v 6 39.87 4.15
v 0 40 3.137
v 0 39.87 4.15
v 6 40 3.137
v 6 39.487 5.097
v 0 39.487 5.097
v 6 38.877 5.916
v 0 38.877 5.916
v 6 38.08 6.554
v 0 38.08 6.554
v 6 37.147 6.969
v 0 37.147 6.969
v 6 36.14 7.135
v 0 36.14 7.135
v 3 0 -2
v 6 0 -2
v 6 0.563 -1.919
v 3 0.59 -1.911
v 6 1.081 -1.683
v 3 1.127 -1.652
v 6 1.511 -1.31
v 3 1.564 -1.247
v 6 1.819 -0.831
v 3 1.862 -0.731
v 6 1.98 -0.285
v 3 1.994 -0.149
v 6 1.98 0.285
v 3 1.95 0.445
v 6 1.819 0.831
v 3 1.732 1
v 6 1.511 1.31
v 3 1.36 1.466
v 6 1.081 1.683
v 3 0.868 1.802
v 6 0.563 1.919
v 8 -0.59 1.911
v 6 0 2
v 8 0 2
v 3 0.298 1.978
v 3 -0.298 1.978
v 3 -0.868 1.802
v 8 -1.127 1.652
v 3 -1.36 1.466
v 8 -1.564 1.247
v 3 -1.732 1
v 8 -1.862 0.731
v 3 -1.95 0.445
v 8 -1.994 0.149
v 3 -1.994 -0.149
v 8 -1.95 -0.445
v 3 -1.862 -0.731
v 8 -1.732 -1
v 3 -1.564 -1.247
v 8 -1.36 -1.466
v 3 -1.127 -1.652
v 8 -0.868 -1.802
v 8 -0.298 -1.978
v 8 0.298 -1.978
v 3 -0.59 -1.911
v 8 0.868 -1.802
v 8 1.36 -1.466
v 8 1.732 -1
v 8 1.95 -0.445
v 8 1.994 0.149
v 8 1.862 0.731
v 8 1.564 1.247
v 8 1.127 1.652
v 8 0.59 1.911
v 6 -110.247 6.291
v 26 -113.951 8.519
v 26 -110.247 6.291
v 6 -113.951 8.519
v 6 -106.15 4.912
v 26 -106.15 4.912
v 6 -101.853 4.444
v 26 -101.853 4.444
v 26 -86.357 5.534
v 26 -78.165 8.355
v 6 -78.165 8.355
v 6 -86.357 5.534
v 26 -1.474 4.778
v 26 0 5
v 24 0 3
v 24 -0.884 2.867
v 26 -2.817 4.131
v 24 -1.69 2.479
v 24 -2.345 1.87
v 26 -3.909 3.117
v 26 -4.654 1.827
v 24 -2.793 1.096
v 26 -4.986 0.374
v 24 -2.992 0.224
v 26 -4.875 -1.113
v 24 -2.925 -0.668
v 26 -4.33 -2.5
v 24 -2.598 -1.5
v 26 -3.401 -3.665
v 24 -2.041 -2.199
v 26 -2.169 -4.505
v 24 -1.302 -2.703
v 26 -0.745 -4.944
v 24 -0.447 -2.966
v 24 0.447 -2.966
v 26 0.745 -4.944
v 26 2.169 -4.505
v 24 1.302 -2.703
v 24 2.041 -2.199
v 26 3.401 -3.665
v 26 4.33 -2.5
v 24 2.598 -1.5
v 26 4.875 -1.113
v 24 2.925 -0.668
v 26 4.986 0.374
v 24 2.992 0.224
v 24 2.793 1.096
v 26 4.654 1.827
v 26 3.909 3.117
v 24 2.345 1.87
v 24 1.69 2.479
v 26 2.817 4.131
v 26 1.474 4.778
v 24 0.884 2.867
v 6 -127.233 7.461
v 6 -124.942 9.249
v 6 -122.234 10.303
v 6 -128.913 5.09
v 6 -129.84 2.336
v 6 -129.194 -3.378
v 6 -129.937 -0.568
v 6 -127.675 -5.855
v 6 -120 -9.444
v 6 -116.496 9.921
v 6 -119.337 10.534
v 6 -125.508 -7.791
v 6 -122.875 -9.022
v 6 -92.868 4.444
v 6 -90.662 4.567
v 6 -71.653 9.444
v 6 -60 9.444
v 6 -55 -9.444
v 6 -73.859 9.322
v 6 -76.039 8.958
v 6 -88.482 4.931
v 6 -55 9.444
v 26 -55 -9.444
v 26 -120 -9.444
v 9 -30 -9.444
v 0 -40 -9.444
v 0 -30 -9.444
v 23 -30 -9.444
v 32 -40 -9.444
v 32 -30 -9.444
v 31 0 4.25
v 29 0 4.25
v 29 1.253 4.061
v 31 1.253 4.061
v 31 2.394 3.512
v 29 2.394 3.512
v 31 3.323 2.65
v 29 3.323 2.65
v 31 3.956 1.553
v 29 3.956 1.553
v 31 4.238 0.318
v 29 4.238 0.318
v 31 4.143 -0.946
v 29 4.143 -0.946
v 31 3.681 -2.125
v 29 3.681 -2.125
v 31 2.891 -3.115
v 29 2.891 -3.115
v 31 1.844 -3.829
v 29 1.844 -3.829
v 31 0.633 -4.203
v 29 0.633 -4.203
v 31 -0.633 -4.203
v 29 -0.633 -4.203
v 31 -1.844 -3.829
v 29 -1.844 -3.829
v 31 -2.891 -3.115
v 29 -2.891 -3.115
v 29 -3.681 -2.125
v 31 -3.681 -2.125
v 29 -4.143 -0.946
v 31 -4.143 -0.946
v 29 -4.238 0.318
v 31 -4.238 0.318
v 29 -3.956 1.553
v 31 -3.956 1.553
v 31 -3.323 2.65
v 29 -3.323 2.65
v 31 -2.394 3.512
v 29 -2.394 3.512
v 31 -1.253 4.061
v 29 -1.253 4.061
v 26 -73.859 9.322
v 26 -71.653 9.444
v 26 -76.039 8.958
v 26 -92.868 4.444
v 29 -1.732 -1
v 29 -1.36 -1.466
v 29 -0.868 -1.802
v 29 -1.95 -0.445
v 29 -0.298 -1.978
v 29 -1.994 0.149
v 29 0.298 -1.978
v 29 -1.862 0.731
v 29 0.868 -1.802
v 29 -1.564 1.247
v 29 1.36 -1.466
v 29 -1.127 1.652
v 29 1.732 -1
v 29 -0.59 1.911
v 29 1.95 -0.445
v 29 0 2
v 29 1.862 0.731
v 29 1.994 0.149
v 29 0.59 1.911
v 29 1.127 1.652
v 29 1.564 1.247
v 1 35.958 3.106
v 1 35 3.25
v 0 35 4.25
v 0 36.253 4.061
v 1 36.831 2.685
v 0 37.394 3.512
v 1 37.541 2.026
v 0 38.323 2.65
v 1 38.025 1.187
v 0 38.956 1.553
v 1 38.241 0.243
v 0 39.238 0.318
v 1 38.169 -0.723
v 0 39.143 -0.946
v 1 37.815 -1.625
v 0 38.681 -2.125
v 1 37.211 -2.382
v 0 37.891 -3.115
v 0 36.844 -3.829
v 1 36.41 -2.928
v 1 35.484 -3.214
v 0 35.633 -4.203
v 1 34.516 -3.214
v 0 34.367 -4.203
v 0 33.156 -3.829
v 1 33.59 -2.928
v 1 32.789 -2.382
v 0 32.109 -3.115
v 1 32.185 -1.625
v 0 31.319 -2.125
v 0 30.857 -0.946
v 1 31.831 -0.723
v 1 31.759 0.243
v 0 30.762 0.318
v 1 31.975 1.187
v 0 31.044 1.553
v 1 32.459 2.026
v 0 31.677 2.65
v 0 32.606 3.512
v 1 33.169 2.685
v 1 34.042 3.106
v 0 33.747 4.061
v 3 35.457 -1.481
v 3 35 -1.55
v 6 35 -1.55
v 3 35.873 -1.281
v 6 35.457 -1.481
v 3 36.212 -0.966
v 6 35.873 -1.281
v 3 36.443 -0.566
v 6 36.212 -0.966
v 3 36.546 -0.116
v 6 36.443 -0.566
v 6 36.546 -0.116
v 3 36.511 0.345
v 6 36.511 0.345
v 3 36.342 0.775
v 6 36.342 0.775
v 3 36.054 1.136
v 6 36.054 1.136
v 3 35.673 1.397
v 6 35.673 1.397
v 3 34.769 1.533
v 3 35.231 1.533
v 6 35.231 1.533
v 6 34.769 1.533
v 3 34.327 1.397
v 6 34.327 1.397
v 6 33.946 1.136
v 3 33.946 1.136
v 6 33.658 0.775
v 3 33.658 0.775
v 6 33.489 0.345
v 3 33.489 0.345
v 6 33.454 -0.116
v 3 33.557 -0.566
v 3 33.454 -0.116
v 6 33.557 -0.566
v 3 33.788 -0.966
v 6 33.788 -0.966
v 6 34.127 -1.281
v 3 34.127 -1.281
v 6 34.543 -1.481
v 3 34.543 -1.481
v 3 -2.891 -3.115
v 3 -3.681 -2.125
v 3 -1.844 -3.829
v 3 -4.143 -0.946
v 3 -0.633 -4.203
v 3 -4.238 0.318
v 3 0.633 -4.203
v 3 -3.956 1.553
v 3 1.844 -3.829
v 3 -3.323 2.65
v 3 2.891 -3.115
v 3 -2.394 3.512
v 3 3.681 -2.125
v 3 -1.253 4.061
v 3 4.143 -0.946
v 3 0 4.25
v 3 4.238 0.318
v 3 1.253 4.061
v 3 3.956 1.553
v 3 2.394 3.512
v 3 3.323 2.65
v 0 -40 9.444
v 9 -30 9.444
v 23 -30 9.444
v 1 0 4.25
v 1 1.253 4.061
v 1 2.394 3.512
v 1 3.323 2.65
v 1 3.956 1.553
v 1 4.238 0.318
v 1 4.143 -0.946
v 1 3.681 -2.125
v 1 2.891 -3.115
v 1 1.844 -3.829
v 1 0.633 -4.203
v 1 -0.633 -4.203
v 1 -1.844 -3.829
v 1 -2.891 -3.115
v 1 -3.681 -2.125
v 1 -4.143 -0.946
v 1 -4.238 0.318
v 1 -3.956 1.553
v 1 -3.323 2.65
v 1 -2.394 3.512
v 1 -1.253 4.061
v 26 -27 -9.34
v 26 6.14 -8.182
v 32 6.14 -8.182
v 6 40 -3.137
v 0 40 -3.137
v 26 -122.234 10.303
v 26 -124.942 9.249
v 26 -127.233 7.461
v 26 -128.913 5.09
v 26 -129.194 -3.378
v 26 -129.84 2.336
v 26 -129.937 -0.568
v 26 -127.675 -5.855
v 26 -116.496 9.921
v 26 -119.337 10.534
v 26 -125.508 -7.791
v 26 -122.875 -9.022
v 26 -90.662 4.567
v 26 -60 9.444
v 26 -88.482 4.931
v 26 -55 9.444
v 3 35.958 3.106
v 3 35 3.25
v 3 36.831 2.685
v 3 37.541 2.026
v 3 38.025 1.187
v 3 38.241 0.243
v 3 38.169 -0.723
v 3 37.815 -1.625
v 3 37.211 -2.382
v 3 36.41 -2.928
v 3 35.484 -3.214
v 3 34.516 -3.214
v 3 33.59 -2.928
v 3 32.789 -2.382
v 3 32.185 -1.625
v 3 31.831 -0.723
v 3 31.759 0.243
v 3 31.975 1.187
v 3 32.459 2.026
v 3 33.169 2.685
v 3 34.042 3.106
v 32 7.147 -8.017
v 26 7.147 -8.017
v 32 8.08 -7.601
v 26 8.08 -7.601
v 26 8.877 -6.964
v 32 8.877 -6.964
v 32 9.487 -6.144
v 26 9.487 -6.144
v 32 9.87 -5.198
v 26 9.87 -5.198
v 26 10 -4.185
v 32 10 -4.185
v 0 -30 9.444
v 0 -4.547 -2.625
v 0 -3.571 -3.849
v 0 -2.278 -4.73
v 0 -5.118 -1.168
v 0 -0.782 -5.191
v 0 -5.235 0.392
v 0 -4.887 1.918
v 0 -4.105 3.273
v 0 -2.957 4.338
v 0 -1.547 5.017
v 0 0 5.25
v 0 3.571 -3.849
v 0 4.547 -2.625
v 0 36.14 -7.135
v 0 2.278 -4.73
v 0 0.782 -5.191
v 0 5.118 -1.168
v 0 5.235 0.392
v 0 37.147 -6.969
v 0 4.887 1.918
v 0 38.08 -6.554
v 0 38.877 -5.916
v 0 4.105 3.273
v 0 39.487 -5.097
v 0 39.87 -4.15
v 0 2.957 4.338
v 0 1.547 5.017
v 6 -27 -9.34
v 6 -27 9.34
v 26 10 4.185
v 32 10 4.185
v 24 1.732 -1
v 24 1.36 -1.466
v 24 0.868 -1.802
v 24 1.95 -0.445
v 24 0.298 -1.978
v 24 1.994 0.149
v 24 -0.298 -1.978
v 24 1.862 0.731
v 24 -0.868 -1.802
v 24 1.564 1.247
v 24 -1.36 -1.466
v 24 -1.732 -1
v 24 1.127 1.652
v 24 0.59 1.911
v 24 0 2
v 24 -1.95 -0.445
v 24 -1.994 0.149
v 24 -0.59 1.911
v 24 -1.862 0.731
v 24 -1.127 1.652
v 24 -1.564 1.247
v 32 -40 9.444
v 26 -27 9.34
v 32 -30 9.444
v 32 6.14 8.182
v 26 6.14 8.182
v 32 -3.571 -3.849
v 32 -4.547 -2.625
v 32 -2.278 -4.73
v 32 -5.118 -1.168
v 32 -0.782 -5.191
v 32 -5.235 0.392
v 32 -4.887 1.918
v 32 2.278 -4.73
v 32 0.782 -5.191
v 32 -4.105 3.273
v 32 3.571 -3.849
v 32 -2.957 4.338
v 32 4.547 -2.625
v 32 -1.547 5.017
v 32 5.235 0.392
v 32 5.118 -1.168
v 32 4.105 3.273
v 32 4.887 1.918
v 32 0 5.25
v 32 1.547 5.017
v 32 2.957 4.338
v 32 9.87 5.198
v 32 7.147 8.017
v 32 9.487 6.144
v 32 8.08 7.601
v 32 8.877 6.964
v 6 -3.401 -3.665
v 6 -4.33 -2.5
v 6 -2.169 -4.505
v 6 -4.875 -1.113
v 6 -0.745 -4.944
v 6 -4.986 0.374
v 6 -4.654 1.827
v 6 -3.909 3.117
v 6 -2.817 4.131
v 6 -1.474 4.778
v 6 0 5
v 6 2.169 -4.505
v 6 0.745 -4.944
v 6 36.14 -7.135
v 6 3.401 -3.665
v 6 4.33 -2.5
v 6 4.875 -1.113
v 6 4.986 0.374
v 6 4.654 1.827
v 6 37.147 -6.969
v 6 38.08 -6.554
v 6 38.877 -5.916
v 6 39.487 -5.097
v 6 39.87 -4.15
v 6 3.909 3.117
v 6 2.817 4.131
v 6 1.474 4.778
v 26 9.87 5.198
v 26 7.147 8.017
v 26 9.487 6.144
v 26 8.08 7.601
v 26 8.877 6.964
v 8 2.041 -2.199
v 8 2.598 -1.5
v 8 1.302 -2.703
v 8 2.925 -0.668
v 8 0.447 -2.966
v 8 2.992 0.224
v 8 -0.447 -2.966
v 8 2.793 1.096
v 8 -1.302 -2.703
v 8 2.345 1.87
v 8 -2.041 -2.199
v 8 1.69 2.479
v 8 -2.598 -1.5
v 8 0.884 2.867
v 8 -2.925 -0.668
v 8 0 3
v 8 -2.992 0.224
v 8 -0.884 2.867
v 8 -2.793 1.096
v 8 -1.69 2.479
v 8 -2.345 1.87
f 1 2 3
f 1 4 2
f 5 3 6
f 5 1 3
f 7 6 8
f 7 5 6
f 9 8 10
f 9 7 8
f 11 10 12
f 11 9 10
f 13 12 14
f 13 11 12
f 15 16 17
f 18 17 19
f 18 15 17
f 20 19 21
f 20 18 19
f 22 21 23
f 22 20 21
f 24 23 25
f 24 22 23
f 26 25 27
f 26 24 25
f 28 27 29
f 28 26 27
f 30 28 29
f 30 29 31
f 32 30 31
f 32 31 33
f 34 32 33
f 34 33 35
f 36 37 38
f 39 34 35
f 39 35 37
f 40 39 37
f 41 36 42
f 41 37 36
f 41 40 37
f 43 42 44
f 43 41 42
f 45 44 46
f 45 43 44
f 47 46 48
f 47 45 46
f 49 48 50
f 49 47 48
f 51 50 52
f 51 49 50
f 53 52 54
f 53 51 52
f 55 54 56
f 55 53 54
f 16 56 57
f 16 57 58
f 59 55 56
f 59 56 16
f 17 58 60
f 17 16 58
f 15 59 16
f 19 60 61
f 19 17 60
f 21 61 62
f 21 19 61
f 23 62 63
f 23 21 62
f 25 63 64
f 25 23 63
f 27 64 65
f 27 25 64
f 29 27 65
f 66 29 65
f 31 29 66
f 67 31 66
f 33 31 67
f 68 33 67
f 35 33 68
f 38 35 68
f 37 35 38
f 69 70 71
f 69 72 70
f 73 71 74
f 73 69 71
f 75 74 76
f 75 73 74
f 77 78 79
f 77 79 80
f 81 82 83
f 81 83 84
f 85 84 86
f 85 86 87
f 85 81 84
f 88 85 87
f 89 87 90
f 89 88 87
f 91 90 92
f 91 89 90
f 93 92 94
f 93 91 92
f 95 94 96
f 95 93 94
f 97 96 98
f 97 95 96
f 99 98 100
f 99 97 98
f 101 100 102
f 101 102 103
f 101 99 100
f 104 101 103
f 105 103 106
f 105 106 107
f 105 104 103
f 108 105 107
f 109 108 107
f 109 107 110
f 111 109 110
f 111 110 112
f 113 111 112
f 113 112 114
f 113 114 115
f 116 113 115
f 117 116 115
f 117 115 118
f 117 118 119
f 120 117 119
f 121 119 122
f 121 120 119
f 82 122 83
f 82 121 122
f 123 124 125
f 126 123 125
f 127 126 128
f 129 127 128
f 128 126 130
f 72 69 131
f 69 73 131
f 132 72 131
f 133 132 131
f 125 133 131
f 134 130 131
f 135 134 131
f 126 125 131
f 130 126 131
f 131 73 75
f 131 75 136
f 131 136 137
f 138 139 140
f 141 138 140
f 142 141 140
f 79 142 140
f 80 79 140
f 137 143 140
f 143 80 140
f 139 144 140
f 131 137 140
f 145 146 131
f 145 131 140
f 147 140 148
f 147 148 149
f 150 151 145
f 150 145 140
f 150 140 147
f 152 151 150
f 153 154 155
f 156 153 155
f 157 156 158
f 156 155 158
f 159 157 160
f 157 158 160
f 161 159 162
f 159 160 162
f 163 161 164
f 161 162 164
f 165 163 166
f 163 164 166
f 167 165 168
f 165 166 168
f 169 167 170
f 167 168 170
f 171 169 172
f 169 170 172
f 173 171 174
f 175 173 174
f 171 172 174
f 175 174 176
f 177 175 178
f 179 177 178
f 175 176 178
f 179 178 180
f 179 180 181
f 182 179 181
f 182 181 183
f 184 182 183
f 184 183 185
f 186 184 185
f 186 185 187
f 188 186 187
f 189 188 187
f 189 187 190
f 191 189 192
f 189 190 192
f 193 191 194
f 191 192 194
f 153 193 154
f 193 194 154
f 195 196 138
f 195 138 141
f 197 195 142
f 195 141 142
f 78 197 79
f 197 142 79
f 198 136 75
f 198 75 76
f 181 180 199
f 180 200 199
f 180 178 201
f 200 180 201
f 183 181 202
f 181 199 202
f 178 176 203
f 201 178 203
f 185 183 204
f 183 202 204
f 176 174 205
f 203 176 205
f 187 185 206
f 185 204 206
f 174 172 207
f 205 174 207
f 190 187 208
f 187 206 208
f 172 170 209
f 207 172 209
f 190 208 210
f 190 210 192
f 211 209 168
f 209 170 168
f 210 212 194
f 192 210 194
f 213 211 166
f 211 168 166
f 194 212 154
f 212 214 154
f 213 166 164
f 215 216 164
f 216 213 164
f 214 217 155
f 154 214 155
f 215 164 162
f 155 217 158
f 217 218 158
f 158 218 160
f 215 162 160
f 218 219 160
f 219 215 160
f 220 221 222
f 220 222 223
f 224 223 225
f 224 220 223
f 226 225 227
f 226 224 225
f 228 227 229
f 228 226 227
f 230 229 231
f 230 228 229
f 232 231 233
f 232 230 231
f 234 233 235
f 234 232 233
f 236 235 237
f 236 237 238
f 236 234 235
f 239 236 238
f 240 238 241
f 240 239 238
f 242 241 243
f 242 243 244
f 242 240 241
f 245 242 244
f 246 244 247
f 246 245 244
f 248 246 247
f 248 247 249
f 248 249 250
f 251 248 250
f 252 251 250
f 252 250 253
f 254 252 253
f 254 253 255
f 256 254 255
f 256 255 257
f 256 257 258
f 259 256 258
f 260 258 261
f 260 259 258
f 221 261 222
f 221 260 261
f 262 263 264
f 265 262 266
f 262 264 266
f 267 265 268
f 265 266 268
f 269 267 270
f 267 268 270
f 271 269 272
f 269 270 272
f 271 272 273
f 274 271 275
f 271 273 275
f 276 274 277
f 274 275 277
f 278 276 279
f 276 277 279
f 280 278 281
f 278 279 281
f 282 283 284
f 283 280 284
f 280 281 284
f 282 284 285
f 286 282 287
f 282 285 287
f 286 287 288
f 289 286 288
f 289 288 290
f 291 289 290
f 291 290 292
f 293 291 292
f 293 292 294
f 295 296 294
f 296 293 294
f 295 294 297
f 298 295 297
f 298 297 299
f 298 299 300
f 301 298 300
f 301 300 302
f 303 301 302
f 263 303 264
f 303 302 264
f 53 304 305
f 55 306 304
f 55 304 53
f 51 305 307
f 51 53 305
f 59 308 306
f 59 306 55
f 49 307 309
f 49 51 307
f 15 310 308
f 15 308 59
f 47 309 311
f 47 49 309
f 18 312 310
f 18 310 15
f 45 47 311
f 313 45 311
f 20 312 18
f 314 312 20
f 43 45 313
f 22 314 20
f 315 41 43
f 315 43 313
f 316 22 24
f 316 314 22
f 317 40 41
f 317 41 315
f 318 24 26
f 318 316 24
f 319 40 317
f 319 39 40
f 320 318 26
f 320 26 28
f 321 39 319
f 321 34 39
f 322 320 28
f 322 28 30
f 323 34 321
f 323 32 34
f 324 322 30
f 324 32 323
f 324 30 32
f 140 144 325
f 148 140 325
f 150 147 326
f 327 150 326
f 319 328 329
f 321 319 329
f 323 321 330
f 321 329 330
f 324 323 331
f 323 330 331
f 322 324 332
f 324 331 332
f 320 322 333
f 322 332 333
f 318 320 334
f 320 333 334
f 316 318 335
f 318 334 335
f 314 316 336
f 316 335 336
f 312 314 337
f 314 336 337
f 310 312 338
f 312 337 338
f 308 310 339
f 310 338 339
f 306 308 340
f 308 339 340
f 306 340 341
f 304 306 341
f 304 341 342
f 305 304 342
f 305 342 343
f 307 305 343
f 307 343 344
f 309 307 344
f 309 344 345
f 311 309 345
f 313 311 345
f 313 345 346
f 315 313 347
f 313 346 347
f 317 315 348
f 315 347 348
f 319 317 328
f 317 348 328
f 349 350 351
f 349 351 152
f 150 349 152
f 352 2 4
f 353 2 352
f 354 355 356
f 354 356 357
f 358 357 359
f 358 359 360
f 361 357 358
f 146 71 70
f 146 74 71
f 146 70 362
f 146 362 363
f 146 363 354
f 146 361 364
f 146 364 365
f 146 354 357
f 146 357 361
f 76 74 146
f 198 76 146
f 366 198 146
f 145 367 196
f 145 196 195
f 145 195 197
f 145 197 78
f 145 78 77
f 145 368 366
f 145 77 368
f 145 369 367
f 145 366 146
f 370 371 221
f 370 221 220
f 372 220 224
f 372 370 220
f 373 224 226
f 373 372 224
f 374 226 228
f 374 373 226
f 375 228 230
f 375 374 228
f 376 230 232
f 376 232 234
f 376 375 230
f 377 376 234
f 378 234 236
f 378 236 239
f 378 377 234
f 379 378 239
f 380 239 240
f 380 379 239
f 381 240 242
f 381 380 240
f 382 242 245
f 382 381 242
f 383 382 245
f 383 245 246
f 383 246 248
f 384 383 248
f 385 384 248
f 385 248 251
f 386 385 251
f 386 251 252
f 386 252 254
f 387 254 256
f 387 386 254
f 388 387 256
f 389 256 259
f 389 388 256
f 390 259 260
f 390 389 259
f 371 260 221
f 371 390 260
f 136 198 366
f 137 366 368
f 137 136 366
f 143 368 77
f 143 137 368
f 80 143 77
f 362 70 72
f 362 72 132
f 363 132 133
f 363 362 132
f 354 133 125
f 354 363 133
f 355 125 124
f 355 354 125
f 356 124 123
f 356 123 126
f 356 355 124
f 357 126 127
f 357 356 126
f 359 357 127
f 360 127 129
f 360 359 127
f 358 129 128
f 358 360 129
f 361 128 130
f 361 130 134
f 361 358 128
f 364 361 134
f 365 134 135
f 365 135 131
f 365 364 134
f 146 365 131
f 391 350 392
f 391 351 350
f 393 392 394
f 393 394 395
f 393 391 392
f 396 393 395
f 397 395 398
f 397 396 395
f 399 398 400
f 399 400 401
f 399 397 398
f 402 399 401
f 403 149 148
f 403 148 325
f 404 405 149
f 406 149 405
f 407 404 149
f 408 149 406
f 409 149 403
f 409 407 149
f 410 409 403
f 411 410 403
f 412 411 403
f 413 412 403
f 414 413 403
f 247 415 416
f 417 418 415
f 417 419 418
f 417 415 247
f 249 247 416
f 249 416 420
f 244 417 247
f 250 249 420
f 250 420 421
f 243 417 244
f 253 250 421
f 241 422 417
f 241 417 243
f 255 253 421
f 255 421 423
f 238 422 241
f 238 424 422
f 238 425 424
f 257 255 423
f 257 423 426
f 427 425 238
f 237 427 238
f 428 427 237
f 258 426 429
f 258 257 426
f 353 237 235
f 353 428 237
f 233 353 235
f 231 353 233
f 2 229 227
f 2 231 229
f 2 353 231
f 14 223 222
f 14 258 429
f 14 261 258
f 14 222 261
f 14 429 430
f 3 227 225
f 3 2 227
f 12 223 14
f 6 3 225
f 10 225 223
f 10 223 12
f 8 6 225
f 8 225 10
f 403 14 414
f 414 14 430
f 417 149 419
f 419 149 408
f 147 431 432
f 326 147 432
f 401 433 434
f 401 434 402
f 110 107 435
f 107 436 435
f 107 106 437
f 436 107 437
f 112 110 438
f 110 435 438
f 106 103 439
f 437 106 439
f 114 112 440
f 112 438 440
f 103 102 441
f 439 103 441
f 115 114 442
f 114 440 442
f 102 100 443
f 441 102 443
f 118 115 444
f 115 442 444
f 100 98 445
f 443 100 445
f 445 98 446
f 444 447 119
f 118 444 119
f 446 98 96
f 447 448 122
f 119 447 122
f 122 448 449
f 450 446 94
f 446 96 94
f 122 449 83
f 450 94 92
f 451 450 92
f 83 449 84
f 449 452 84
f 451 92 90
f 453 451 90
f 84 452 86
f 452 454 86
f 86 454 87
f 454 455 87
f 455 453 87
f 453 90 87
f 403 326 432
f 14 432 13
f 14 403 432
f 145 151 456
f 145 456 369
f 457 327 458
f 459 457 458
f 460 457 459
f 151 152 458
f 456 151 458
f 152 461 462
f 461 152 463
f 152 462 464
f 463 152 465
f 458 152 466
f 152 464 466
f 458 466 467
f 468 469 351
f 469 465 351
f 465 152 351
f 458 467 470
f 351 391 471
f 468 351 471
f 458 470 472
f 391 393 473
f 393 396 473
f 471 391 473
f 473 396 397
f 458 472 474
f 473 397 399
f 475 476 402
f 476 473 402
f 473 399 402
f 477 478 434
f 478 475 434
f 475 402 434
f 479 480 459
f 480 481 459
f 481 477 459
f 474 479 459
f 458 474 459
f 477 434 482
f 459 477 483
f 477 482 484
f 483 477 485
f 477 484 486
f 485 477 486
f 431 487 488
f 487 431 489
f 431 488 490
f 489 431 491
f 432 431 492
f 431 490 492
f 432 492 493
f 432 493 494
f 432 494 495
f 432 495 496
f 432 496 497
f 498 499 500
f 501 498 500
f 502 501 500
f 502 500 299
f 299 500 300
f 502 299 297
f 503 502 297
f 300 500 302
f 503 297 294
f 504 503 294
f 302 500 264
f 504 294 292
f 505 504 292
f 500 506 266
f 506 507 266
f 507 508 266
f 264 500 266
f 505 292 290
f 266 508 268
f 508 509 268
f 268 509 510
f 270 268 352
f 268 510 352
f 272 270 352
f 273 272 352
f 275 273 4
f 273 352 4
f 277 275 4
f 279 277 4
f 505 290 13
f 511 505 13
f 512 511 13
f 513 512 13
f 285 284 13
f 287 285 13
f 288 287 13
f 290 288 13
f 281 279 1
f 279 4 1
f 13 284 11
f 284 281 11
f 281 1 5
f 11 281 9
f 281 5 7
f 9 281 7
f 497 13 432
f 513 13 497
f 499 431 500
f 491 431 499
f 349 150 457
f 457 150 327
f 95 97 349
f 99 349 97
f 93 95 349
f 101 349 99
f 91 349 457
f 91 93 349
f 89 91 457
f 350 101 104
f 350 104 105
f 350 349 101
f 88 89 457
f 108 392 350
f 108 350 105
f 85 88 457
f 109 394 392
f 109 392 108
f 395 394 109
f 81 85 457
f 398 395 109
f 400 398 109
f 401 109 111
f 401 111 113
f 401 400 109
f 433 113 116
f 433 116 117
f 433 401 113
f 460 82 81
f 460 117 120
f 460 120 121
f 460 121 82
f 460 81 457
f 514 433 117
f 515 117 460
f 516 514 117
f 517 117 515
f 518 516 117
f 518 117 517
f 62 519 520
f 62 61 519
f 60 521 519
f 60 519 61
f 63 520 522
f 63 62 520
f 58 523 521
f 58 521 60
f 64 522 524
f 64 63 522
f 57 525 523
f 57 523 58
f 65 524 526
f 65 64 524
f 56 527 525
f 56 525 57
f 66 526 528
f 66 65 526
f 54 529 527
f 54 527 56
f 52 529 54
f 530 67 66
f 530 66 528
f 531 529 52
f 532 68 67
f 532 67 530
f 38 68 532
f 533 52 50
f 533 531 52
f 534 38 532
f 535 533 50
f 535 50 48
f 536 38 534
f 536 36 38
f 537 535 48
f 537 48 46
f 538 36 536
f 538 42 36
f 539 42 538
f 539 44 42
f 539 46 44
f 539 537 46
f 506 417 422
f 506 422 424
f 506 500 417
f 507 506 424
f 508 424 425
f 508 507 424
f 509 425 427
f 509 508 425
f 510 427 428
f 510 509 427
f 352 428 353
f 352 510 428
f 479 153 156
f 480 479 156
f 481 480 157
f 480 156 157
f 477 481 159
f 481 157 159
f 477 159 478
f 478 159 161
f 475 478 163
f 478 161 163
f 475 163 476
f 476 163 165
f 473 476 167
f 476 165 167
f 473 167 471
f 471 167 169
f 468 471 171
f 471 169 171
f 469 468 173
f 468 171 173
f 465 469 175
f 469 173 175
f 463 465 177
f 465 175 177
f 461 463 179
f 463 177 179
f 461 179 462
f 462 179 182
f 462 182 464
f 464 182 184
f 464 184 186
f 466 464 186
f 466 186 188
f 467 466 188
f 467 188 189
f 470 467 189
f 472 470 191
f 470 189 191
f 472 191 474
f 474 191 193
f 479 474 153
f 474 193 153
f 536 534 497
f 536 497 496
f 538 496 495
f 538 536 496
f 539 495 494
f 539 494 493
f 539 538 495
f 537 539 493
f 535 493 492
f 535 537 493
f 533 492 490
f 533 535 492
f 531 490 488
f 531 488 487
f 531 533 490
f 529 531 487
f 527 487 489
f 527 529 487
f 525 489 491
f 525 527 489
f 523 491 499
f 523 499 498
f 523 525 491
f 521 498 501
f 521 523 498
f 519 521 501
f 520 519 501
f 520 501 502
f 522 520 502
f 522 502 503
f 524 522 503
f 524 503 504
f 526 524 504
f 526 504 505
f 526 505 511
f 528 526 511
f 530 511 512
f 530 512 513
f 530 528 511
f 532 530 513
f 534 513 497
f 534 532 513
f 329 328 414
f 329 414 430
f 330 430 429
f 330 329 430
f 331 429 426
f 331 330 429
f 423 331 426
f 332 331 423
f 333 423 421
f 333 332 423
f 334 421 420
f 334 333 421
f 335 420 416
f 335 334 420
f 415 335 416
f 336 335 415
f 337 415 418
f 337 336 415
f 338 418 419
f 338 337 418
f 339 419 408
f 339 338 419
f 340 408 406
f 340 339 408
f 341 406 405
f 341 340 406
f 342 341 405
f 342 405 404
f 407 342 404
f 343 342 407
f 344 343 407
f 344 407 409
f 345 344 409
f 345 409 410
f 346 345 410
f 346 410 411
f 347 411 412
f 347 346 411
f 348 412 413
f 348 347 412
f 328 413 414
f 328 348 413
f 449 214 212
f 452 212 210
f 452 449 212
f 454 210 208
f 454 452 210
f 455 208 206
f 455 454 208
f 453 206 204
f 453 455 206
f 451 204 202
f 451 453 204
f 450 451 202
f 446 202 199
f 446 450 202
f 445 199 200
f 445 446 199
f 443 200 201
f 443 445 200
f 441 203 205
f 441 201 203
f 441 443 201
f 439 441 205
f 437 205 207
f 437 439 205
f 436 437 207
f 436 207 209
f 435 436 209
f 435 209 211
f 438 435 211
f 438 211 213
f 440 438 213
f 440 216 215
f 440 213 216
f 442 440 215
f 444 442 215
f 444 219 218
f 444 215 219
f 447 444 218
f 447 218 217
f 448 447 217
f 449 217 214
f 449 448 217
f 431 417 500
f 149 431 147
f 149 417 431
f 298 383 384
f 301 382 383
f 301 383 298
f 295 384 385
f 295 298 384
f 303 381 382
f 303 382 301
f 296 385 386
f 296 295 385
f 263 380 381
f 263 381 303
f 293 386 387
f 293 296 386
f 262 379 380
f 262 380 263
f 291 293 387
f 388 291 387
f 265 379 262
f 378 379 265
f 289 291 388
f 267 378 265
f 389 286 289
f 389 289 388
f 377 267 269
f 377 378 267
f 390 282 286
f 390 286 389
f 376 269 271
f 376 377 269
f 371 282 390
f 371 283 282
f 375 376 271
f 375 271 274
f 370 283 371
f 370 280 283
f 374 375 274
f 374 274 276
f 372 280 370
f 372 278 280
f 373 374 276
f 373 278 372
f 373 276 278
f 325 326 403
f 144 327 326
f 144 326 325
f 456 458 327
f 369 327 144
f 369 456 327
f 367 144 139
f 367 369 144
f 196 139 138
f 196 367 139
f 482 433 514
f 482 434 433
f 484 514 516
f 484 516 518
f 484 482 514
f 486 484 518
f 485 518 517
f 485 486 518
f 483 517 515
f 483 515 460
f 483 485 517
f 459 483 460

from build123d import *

# Parameters (mm, degrees)
SKETCH1_R           = 2
BOSS_EXTRUDE1_DEPTH = 6
SKETCH2_R           = 4.25
CUT_EXTRUDE1_DEPTH  = 3
SKETCH3_W           = 18.888907728
SKETCH3_H           = 10
BOSS_EXTRUDE2_DEPTH = 32
BOSS_EXTRUDE3_START = -6
SKETCH4_R           = 2
BOSS_EXTRUDE3_DEPTH = 6
FILLET1_R           = 4
CUT_EXTRUDE2_START  = -29
SKETCH2_2_R         = 4.25
CUT_EXTRUDE2_DEPTH  = 3
CHAMFER1_SIZE       = 1
CHAMFER2_SIZE       = 3
SKETCH5_R           = 3
SKETCH5_R_2         = 2
BOSS_EXTRUDE4_DEPTH = 2
BOSS_EXTRUDE5_START = 18
SKETCH5_2_R         = 3
SKETCH5_2_R_2       = 2
BOSS_EXTRUDE5_DEPTH = 2
CHAMFER4_SIZE       = 2
BOSS_EXTRUDE6_DEPTH = 18.888907729
BOSS_EXTRUDE7_DEPTH = 20
CHAMFER5_SIZE       = 15
CHAMFER5_SIZE_2     = 5.164914199
FILLET2_R           = 20
SKETCH9_R           = 1.55
CUT_EXTRUDE3_DEPTH  = 6
CUT_EXTRUDE4_START  = -3
SKETCH10_R          = 3.25
SKETCH10_R_2        = 1.55
CUT_EXTRUDE4_DEPTH  = 3
CHAMFER6_SIZE       = 1


# Some blends are built 0.0001 mm under size
with BuildPart() as part:
    # Sketch1 → Boss-Extrude1 (new body)
    with BuildSketch(Plane(origin=(0, 0, 0), x_dir=(0, 0, -1), z_dir=(1, 0, 0))):
        Polygon((-9.444453864, -30), (-7, 40), (7, 40), (9.444453864, -30), align=None)
        Circle(SKETCH1_R, mode=Mode.SUBTRACT)
    extrude(amount=BOSS_EXTRUDE1_DEPTH)

    # Sketch2 → Cut-Extrude1 (cut)
    with BuildSketch(Plane.ZY):
        Circle(SKETCH2_R)
    extrude(amount=-CUT_EXTRUDE1_DEPTH, mode=Mode.SUBTRACT)

    # Sketch3 → Boss-Extrude2 (add)
    with BuildSketch(Plane.ZY):
        with Locations((0, -35)):
            Rectangle(SKETCH3_W, SKETCH3_H)
    extrude(amount=-BOSS_EXTRUDE2_DEPTH)

    # Sketch4 → Boss-Extrude3 (add)
    with BuildSketch(Plane(origin=(32, 0, 0), x_dir=(0, 0, -1), z_dir=(1, 0, 0)).offset(BOSS_EXTRUDE3_START)):
        Polygon((9.444453864, -30), (-9.444453864, -30), (-8.047623085, 10), (8.047623085, 10), align=None)
        with Locations(Location((0, 0, 0), (0, 0, 180))):
            Circle(SKETCH4_R, mode=Mode.SUBTRACT)
    extrude(amount=BOSS_EXTRUDE3_DEPTH)

    # Fillet1
    fillet1_edges = [part.edges().sort_by_distance(p)[0] for p in [
        (29, 10, -8.047623085),
        (29, 10, 8.047623085),
        (3, 40, 7),
        (3, 40, -7),
    ]]
    fillet(fillet1_edges, radius=FILLET1_R)

    # Sketch2<2> → Cut-Extrude2 (cut)
    with BuildSketch(Plane.ZY.offset(CUT_EXTRUDE2_START)):
        Circle(SKETCH2_2_R)
    extrude(amount=-CUT_EXTRUDE2_DEPTH, mode=Mode.SUBTRACT)

    # Chamfer1
    chamfer1_edges = [part.edges().sort_by_distance(p)[0] for p in [
        (0, 0, -4.25),
        (32, 0, -4.25),
    ]]
    chamfer(chamfer1_edges, length=CHAMFER1_SIZE)

    # Chamfer2
    chamfer2_edges = [part.edges().sort_by_distance(p)[0] for p in [
        (26, -30, 0),
        (6, -30, 0),
    ]]
    chamfer(chamfer2_edges, length=CHAMFER2_SIZE)

    # Sketch5 → Boss-Extrude4 (add)
    with BuildSketch(Plane(origin=(6, 0, 0), x_dir=(0, 0, -1), z_dir=(1, 0, 0))):
        with Locations(Location((0, 0, 0), (0, 0, 180))):
            Circle(SKETCH5_R)
        with Locations(Location((0, 0, 0), (0, 0, 180))):
            Circle(SKETCH5_R_2, mode=Mode.SUBTRACT)
    extrude(amount=BOSS_EXTRUDE4_DEPTH)

    # Sketch5<2> → Boss-Extrude5 (add)
    with BuildSketch(Plane(origin=(6, 0, 0), x_dir=(0, 0, -1), z_dir=(1, 0, 0)).offset(BOSS_EXTRUDE5_START)):
        with Locations(Location((0, 0, 0), (0, 0, 180))):
            Circle(SKETCH5_2_R)
        with Locations(Location((0, 0, 0), (0, 0, 180))):
            Circle(SKETCH5_2_R_2, mode=Mode.SUBTRACT)
    extrude(amount=BOSS_EXTRUDE5_DEPTH)

    # Chamfer4
    chamfer4_edges = [part.edges().sort_by_distance(p)[0] for p in [
        (6, 0, -3),
        (26, 0, -3),
    ]]
    chamfer(chamfer4_edges, length=CHAMFER4_SIZE - 0.0001)  # a hair under: the kernel refuses the full size

    # Sketch7 → Boss-Extrude6 (add)
    with BuildSketch(Plane(origin=(0, 0, -9.444453864), x_dir=(-1, 0, 0), z_dir=(0, 0, -1))):
        Polygon((-32, -40), (-26, -55), (-26, -60), (-6, -60), (-6, -55), (0, -40), align=None)
    extrude(amount=-BOSS_EXTRUDE6_DEPTH)

    # Sketch8 → Boss-Extrude7 (add)
    with BuildSketch(Plane(origin=(26, 0, 0), x_dir=(0, 0, -1), z_dir=(1, 0, 0))):
        with BuildLine():
            Line((9.444453864, -60), (-9.444453864, -60))
            Line((-9.444453864, -60), (-9.444453864, -90))
            Line((-9.444453864, -90), (-4.444453864, -90))
            Line((-4.444453864, -90), (-4.444453864, -110.787161313))
            ThreePointArc((-4.444453864, -110.787161313), (-6.083245599, -128.333338985), (9.444453864, -120))
            Line((9.444453864, -120), (9.444453864, -60))
        make_face()
    extrude(amount=-BOSS_EXTRUDE7_DEPTH)

    # Chamfer5
    # the kernel refuses this chamfer: 15, 5.164914199 mm, written as the material it takes off along each edge
    with BuildSketch(Plane(origin=(64.9213417, -90, 9.444453864), x_dir=(0, 0.9999212813122312, 0.012547158200392249), z_dir=(-1, 0, 0))) as chamfer5_piece_1_section:
        Polygon((CHAMFER5_SIZE * 0.999921281312, CHAMFER5_SIZE * 0.0125471582004), (-CHAMFER5_SIZE_2 * 0.0125471582012, CHAMFER5_SIZE_2 * 0.999921281379), (0, 0), align=None)
    chamfer5_piece_1 = extrude(amount=97.842683401, mode=Mode.PRIVATE)
    chamfer5_piece_1 = split(chamfer5_piece_1, bisect_by=Plane(origin=(16, -84.819367326, 4.444453864), z_dir=(0, 0, 1)), keep=Keep.TOP, mode=Mode.PRIVATE)
    add(chamfer5_piece_1, mode=Mode.SUBTRACT)

    # Fillet2
    fillet2_edges = [part.edges().sort_by_distance(p)[0] for p in [
        (16, -110.787161313, 4.444453864),
        (16, -75, 9.444453864),
        (16, -89.521054388, 4.444453864),
    ]]
    fillet(fillet2_edges, radius=FILLET2_R)

    # Sketch9 → Cut-Extrude3 (cut)
    with BuildSketch(Plane(origin=(6, 0, 0), x_dir=(0, 0, -1), z_dir=(1, 0, 0))):
        with Locations((0, 35)):
            Circle(SKETCH9_R)
    extrude(amount=-CUT_EXTRUDE3_DEPTH, mode=Mode.SUBTRACT)

    # Sketch10 → Cut-Extrude4 (cut)
    with BuildSketch(Plane.ZY.offset(CUT_EXTRUDE4_START)):
        with Locations((0, 35)):
            Circle(SKETCH10_R)
        with Locations(Location((0, 35, 0), (0, 0, 180))):
            Circle(SKETCH10_R_2, mode=Mode.SUBTRACT)
    extrude(amount=CUT_EXTRUDE4_DEPTH, mode=Mode.SUBTRACT)

    # Chamfer6
    chamfer6_edges = [part.edges().sort_by_distance(p)[0] for p in [
        (0, 35, -3.25),
    ]]
    chamfer(chamfer6_edges, length=CHAMFER6_SIZE)


solid = part.part
